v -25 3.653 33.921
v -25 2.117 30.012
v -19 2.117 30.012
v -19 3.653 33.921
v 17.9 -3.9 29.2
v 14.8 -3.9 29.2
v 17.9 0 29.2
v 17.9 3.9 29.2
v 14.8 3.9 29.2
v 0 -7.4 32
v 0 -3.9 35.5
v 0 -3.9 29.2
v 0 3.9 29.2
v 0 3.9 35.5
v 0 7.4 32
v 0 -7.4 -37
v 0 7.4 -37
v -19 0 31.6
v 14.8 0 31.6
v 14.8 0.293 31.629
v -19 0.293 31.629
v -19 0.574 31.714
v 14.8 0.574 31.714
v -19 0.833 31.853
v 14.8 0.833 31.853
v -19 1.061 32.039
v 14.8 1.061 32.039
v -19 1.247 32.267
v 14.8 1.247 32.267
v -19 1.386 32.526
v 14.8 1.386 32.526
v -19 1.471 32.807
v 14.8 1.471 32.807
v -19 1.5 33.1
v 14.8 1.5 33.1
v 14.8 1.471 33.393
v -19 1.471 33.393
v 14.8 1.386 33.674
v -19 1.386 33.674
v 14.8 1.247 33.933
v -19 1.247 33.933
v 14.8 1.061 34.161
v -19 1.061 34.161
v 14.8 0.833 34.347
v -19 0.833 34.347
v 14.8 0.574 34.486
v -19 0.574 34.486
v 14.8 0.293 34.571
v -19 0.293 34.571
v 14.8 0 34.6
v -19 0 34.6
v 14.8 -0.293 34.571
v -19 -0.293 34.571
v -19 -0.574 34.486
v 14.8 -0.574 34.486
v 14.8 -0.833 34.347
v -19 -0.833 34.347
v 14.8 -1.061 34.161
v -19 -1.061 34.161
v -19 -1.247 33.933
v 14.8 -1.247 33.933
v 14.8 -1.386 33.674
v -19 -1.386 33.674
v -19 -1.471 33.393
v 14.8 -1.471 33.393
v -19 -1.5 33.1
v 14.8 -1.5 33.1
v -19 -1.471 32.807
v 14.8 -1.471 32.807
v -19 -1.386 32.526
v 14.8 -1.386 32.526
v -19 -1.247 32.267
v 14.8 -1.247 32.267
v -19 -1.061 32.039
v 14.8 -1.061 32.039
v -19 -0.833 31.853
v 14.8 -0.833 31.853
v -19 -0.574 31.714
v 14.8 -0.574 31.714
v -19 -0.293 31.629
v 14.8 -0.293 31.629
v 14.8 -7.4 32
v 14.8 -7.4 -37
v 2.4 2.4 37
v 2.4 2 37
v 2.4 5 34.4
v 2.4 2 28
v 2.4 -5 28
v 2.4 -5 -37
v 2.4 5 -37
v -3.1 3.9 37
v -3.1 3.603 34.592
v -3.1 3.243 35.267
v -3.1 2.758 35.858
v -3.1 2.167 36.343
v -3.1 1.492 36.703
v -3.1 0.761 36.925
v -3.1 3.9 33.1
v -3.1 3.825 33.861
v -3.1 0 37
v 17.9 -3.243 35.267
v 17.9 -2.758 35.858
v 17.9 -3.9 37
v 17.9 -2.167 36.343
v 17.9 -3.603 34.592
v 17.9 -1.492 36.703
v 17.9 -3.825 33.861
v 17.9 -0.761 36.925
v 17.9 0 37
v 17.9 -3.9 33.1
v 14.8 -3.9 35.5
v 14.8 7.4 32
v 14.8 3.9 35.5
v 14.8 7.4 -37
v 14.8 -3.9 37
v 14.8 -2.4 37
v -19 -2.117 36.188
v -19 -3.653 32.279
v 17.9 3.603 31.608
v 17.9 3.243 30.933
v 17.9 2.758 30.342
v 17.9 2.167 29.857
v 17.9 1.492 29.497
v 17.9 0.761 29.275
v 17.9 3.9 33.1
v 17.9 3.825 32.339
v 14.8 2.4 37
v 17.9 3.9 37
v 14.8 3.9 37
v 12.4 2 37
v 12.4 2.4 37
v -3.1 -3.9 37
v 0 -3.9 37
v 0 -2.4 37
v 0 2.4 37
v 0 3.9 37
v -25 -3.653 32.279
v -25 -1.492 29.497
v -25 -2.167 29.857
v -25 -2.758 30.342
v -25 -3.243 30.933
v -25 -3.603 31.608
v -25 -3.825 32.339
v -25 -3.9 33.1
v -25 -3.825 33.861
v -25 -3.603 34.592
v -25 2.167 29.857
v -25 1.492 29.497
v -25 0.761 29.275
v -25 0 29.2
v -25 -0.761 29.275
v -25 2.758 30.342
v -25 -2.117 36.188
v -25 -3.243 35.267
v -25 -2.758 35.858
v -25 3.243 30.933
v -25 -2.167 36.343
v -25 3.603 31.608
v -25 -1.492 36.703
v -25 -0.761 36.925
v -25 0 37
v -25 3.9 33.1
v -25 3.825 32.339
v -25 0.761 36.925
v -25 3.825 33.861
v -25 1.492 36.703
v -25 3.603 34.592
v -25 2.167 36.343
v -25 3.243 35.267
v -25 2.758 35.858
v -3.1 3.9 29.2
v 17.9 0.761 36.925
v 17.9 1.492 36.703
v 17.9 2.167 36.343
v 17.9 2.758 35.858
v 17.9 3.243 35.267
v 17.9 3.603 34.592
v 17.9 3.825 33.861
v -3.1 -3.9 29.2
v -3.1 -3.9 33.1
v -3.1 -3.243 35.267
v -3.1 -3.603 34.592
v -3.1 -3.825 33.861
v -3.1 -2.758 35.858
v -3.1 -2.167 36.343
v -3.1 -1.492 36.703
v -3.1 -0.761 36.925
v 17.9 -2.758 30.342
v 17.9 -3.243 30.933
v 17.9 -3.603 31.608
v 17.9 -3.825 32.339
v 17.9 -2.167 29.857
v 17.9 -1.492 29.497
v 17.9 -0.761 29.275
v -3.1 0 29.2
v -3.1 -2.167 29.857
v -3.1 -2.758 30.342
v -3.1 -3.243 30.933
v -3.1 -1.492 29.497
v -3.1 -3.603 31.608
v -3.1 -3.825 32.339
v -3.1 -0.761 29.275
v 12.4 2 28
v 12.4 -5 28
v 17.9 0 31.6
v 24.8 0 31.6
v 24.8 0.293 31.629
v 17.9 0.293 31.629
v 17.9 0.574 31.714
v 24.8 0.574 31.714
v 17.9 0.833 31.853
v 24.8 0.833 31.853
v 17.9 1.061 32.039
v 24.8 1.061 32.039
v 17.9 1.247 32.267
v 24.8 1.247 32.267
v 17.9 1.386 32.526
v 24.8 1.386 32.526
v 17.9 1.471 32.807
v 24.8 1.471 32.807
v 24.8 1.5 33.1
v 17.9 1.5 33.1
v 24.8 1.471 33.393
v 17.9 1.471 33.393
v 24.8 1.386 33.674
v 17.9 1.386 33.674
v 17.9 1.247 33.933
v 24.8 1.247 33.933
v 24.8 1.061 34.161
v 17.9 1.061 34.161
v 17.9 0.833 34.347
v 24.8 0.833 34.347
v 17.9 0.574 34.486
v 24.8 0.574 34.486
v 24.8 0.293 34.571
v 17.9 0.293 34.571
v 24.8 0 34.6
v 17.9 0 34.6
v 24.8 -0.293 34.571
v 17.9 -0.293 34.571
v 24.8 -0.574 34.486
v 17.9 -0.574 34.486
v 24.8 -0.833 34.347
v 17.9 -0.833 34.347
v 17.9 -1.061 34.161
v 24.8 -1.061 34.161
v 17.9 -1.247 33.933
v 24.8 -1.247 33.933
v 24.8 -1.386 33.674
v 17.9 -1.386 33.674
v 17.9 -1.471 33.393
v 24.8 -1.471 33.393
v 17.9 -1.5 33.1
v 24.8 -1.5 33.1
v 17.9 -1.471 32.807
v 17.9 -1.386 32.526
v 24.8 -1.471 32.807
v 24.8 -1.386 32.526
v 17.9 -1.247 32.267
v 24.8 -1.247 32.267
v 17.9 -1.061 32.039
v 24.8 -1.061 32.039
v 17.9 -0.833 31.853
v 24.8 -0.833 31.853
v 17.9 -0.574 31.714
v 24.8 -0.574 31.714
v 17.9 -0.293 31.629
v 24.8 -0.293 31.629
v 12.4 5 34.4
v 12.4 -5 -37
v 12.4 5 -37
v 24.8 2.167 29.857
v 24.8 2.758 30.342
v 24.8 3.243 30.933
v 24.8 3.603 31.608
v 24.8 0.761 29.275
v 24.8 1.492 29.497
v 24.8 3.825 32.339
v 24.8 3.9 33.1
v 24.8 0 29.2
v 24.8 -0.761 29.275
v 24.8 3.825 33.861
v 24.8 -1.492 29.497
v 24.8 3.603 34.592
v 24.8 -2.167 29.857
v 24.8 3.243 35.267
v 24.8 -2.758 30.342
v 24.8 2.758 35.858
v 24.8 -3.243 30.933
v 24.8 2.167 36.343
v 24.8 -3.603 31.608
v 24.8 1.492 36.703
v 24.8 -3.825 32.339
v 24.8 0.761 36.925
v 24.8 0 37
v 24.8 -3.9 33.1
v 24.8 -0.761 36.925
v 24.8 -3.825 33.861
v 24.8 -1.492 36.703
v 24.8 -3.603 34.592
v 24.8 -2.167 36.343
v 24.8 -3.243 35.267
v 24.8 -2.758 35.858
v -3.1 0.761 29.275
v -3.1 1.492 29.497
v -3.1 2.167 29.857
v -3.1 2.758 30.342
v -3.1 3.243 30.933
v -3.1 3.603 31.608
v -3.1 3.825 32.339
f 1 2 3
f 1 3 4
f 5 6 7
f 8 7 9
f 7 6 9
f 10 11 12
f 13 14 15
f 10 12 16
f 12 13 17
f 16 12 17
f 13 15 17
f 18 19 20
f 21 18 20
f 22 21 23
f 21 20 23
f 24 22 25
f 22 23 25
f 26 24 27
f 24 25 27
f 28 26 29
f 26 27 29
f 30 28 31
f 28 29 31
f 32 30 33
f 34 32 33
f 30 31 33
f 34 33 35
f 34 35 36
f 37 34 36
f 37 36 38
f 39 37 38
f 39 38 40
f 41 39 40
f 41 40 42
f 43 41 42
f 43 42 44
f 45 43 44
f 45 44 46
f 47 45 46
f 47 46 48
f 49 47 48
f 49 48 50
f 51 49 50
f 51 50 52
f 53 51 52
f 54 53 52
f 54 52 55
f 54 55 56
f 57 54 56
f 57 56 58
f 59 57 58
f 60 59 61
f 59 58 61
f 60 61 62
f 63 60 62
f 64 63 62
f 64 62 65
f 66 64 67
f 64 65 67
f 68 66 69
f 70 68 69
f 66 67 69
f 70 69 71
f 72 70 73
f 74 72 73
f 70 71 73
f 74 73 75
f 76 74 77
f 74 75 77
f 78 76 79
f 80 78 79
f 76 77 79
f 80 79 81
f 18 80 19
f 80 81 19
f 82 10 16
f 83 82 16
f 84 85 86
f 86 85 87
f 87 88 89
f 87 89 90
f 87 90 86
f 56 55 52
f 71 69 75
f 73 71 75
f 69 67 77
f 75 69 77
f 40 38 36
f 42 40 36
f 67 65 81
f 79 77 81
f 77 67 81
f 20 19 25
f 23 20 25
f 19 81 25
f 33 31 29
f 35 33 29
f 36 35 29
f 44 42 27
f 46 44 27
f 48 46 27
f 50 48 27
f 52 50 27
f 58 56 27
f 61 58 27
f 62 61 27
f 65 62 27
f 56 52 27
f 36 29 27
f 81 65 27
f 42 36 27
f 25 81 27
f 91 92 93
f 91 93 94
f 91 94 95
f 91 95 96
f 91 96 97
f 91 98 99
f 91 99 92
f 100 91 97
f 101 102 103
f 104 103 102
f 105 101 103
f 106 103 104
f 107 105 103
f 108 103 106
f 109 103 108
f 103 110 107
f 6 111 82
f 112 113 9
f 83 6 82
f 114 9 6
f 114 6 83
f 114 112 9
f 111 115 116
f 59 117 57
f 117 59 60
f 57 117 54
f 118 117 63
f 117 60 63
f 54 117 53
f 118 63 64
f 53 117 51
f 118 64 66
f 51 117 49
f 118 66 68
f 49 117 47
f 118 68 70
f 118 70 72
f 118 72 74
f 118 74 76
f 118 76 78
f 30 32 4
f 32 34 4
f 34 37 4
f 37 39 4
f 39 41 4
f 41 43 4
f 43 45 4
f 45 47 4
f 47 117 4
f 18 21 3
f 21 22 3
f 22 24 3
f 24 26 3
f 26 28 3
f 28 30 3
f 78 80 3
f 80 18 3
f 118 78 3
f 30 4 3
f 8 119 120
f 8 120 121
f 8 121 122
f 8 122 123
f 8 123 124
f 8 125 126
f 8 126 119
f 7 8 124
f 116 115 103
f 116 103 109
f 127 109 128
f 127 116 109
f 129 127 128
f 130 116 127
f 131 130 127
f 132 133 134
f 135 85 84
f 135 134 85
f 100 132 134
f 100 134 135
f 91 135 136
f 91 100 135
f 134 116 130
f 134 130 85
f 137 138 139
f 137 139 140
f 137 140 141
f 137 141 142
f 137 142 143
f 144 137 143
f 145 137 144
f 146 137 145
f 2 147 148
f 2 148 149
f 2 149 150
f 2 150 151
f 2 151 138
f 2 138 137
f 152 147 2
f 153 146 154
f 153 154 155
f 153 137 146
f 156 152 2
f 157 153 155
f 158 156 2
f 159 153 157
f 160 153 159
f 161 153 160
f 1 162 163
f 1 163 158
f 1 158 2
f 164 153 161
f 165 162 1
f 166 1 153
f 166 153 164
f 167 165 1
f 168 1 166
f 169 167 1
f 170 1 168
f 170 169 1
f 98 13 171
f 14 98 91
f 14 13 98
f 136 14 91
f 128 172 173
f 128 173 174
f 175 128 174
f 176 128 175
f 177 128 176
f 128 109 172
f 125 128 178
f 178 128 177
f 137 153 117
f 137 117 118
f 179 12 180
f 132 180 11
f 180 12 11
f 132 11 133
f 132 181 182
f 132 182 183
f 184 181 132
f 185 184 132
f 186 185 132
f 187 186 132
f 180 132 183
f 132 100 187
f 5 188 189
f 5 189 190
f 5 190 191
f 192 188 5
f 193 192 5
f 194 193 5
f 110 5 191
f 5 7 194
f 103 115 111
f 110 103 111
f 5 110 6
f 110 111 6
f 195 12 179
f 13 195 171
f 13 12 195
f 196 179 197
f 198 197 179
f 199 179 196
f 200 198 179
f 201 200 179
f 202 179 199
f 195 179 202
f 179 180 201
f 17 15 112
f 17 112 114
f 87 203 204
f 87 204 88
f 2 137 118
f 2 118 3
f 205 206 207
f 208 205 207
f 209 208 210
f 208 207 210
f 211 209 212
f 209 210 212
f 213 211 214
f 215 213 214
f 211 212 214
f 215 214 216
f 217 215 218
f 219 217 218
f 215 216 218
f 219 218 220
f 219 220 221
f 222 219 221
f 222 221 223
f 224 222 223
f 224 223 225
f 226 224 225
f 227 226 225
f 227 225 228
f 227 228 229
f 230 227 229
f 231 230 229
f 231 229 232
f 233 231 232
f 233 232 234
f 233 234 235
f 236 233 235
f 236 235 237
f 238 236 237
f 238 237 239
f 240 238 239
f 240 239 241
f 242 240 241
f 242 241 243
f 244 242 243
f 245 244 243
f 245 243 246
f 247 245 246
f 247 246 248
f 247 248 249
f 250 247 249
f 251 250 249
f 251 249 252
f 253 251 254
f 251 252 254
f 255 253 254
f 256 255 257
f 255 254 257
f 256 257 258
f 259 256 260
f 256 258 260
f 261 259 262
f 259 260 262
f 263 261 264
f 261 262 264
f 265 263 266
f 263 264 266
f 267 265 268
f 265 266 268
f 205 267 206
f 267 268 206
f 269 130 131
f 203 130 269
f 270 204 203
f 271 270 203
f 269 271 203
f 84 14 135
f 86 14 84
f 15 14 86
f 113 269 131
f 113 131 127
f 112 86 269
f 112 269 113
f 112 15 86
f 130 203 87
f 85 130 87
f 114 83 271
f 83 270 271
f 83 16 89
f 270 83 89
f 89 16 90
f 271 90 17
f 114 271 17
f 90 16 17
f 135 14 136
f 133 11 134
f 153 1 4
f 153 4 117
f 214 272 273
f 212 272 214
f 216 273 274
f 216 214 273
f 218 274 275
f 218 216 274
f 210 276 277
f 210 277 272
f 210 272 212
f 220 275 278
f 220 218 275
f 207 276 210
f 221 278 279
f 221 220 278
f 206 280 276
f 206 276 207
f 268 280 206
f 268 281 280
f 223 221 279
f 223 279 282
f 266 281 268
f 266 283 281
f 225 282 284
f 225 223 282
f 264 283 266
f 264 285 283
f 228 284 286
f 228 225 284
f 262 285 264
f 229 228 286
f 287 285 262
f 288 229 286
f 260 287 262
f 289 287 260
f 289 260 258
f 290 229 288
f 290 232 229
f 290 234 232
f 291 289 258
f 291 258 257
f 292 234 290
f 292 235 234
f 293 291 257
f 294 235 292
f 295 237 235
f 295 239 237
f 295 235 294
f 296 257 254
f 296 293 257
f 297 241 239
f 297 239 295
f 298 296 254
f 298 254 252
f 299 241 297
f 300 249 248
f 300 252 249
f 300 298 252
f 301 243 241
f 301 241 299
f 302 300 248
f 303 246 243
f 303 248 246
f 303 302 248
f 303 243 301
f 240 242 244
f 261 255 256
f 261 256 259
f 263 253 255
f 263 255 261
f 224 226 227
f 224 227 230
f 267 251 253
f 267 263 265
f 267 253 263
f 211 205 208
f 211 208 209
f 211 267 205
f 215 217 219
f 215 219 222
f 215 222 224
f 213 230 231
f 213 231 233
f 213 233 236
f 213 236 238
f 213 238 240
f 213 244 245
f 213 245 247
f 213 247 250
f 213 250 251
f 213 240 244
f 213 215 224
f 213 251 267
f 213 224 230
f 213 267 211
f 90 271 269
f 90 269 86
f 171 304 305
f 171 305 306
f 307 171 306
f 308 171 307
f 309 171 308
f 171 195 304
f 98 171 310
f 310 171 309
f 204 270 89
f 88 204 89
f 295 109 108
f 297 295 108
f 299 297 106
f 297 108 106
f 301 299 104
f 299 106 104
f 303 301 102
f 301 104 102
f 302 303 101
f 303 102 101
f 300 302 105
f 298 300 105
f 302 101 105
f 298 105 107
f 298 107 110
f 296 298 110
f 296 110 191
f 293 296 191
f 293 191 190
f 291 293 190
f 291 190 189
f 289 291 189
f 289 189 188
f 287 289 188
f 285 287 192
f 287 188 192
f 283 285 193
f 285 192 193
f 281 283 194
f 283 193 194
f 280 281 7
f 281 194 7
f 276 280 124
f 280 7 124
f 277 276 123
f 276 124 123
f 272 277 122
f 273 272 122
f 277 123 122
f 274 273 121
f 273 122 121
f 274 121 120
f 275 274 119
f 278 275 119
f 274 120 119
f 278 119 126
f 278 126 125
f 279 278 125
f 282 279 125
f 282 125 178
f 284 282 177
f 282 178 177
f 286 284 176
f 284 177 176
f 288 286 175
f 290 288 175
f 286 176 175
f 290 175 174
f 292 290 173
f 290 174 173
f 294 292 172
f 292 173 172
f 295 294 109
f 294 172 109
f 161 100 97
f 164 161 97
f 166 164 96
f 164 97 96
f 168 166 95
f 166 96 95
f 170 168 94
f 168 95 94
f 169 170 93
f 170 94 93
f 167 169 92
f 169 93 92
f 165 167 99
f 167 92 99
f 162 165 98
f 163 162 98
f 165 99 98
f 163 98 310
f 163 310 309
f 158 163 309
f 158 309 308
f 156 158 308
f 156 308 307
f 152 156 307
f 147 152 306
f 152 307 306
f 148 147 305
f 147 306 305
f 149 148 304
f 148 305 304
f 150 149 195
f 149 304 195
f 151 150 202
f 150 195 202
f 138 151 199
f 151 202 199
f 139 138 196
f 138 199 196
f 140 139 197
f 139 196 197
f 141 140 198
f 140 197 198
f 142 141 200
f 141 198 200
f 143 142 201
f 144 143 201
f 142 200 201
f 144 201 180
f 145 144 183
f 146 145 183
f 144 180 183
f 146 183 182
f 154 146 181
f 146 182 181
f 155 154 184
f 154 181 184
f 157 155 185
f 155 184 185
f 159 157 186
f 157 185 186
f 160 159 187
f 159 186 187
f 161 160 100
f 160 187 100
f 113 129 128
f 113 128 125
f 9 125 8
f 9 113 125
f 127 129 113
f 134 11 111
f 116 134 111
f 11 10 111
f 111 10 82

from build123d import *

# Parameters (mm, degrees)
SKETCH_1_W          = 74
SKETCH_1_H          = 14.8
EXTRUDE_1_DEPTH     = 14.8
SKETCH_2_W          = 10
SKETCH_2_H          = 10
CUT_EXTRUDE_1_DEPTH = 65
SKETCH_3_R          = 3.9
EXTRUDE_2_DEPTH     = 10
SKETCH_4_R          = 3.9
EXTRUDE_3_DEPTH     = 25
CHAMFER_1_SIZE      = 5
CUT_EXTRUDE_2_DEPTH = 6
SKETCH_8_R          = 1.5
CUT_EXTRUDE_4_DEPTH = 50.8
SKETCH_9_W          = 7.8
SKETCH_9_H          = 7.8
SKETCH_9_R          = 1.5
EXTRUDE_4_DEPTH     = 3.1
SKETCH_10_W         = 7.8
SKETCH_10_H         = 7.8
EXTRUDE_5_DEPTH     = 3.1
SKETCH_11_W         = 10
SKETCH_11_H         = 3
CUT_EXTRUDE_5_DEPTH = 10


with BuildPart() as part:
    # Эскиз1 → Бобышка-Вытянуть1 (new body)
    with BuildSketch(Plane(origin=(0, 0, 0), x_dir=(0, 0, -1), z_dir=(1, 0, 0))):
        Rectangle(SKETCH_1_W, SKETCH_1_H)
    extrude(amount=EXTRUDE_1_DEPTH)

    # Эскиз2 → Вырез-Вытянуть1 (cut)
    with BuildSketch(Plane(origin=(0, 0, -37), x_dir=(-1, 0, 0), z_dir=(0, 0, -1))):
        with Locations((-7.4, 0)):
            Rectangle(SKETCH_2_W, SKETCH_2_H)
    extrude(amount=-CUT_EXTRUDE_1_DEPTH, mode=Mode.SUBTRACT)

    # Эскиз3 → Бобышка-Вытянуть2 (add)
    with BuildSketch(Plane(origin=(14.8, 0, 0), x_dir=(0, 0, -1), z_dir=(1, 0, 0))):
        with Locations(Location((-33.1, 0, 0), (0, 0, 180))):  # turned: the seam where the file's is
            Circle(SKETCH_3_R)
    extrude(amount=EXTRUDE_2_DEPTH)

    # Эскиз4 → Бобышка-Вытянуть3 (add)
    with BuildSketch(Plane.ZY):
        with Locations((33.1, 0)):
            Circle(SKETCH_4_R)
    extrude(amount=EXTRUDE_3_DEPTH)

    # Фаска1
    chamfer_1_edges = [part.edges().sort_by_distance(p)[0] for p in [
        (7.4, 7.4, 37),
        (7.4, -7.4, 37),
    ]]
    chamfer(chamfer_1_edges, length=CHAMFER_1_SIZE)

    # Эскиз5 → Вырез-Вытянуть2 (cut)
    with BuildSketch(Plane.ZY.offset(25)):
        Polygon((30.011815854, 2.11733764), (33.920911448, 3.653232048), (36.188184146, -2.11733764), (32.279088552, -3.653232048), align=None)
    extrude(amount=-CUT_EXTRUDE_2_DEPTH, mode=Mode.SUBTRACT)

    # Эскиз8 → Вырез-Вытянуть4 (cut, through all)
    with BuildSketch(Plane(origin=(24.8, 0, 0), x_dir=(0, 0, -1), z_dir=(1, 0, 0))):
        with Locations((-33.1, 0)):
            Circle(SKETCH_8_R)
    extrude(amount=-CUT_EXTRUDE_4_DEPTH, mode=Mode.SUBTRACT)

    # Эскиз9 → Бобышка-Вытянуть4 (add)
    with BuildSketch(Plane.ZY):
        with Locations((33.1, 0)):
            Rectangle(SKETCH_9_W, SKETCH_9_H)
        with Locations(Location((33.1, 0, 0), (0, 0, 180))):  # turned: the seam where the file's is
            Circle(SKETCH_9_R, mode=Mode.SUBTRACT)
    extrude(amount=EXTRUDE_4_DEPTH)

    # Эскиз10 → Бобышка-Вытянуть5 (add)
    with BuildSketch(Plane(origin=(14.8, 0, 0), x_dir=(0, 0, -1), z_dir=(1, 0, 0))):
        with Locations((-33.1, 0)):
            Rectangle(SKETCH_10_W, SKETCH_10_H)
    extrude(amount=EXTRUDE_5_DEPTH)

    # Эскиз11 → Вырез-Вытянуть5 (cut, through all)
    with BuildSketch(Plane(origin=(0, 0, 28), x_dir=(-1, 0, 0), z_dir=(0, 0, -1))):
        with Locations((-7.4, 3.5)):
            Rectangle(SKETCH_11_W, SKETCH_11_H)
    extrude(amount=-CUT_EXTRUDE_5_DEPTH, mode=Mode.SUBTRACT)


solid = part.part
